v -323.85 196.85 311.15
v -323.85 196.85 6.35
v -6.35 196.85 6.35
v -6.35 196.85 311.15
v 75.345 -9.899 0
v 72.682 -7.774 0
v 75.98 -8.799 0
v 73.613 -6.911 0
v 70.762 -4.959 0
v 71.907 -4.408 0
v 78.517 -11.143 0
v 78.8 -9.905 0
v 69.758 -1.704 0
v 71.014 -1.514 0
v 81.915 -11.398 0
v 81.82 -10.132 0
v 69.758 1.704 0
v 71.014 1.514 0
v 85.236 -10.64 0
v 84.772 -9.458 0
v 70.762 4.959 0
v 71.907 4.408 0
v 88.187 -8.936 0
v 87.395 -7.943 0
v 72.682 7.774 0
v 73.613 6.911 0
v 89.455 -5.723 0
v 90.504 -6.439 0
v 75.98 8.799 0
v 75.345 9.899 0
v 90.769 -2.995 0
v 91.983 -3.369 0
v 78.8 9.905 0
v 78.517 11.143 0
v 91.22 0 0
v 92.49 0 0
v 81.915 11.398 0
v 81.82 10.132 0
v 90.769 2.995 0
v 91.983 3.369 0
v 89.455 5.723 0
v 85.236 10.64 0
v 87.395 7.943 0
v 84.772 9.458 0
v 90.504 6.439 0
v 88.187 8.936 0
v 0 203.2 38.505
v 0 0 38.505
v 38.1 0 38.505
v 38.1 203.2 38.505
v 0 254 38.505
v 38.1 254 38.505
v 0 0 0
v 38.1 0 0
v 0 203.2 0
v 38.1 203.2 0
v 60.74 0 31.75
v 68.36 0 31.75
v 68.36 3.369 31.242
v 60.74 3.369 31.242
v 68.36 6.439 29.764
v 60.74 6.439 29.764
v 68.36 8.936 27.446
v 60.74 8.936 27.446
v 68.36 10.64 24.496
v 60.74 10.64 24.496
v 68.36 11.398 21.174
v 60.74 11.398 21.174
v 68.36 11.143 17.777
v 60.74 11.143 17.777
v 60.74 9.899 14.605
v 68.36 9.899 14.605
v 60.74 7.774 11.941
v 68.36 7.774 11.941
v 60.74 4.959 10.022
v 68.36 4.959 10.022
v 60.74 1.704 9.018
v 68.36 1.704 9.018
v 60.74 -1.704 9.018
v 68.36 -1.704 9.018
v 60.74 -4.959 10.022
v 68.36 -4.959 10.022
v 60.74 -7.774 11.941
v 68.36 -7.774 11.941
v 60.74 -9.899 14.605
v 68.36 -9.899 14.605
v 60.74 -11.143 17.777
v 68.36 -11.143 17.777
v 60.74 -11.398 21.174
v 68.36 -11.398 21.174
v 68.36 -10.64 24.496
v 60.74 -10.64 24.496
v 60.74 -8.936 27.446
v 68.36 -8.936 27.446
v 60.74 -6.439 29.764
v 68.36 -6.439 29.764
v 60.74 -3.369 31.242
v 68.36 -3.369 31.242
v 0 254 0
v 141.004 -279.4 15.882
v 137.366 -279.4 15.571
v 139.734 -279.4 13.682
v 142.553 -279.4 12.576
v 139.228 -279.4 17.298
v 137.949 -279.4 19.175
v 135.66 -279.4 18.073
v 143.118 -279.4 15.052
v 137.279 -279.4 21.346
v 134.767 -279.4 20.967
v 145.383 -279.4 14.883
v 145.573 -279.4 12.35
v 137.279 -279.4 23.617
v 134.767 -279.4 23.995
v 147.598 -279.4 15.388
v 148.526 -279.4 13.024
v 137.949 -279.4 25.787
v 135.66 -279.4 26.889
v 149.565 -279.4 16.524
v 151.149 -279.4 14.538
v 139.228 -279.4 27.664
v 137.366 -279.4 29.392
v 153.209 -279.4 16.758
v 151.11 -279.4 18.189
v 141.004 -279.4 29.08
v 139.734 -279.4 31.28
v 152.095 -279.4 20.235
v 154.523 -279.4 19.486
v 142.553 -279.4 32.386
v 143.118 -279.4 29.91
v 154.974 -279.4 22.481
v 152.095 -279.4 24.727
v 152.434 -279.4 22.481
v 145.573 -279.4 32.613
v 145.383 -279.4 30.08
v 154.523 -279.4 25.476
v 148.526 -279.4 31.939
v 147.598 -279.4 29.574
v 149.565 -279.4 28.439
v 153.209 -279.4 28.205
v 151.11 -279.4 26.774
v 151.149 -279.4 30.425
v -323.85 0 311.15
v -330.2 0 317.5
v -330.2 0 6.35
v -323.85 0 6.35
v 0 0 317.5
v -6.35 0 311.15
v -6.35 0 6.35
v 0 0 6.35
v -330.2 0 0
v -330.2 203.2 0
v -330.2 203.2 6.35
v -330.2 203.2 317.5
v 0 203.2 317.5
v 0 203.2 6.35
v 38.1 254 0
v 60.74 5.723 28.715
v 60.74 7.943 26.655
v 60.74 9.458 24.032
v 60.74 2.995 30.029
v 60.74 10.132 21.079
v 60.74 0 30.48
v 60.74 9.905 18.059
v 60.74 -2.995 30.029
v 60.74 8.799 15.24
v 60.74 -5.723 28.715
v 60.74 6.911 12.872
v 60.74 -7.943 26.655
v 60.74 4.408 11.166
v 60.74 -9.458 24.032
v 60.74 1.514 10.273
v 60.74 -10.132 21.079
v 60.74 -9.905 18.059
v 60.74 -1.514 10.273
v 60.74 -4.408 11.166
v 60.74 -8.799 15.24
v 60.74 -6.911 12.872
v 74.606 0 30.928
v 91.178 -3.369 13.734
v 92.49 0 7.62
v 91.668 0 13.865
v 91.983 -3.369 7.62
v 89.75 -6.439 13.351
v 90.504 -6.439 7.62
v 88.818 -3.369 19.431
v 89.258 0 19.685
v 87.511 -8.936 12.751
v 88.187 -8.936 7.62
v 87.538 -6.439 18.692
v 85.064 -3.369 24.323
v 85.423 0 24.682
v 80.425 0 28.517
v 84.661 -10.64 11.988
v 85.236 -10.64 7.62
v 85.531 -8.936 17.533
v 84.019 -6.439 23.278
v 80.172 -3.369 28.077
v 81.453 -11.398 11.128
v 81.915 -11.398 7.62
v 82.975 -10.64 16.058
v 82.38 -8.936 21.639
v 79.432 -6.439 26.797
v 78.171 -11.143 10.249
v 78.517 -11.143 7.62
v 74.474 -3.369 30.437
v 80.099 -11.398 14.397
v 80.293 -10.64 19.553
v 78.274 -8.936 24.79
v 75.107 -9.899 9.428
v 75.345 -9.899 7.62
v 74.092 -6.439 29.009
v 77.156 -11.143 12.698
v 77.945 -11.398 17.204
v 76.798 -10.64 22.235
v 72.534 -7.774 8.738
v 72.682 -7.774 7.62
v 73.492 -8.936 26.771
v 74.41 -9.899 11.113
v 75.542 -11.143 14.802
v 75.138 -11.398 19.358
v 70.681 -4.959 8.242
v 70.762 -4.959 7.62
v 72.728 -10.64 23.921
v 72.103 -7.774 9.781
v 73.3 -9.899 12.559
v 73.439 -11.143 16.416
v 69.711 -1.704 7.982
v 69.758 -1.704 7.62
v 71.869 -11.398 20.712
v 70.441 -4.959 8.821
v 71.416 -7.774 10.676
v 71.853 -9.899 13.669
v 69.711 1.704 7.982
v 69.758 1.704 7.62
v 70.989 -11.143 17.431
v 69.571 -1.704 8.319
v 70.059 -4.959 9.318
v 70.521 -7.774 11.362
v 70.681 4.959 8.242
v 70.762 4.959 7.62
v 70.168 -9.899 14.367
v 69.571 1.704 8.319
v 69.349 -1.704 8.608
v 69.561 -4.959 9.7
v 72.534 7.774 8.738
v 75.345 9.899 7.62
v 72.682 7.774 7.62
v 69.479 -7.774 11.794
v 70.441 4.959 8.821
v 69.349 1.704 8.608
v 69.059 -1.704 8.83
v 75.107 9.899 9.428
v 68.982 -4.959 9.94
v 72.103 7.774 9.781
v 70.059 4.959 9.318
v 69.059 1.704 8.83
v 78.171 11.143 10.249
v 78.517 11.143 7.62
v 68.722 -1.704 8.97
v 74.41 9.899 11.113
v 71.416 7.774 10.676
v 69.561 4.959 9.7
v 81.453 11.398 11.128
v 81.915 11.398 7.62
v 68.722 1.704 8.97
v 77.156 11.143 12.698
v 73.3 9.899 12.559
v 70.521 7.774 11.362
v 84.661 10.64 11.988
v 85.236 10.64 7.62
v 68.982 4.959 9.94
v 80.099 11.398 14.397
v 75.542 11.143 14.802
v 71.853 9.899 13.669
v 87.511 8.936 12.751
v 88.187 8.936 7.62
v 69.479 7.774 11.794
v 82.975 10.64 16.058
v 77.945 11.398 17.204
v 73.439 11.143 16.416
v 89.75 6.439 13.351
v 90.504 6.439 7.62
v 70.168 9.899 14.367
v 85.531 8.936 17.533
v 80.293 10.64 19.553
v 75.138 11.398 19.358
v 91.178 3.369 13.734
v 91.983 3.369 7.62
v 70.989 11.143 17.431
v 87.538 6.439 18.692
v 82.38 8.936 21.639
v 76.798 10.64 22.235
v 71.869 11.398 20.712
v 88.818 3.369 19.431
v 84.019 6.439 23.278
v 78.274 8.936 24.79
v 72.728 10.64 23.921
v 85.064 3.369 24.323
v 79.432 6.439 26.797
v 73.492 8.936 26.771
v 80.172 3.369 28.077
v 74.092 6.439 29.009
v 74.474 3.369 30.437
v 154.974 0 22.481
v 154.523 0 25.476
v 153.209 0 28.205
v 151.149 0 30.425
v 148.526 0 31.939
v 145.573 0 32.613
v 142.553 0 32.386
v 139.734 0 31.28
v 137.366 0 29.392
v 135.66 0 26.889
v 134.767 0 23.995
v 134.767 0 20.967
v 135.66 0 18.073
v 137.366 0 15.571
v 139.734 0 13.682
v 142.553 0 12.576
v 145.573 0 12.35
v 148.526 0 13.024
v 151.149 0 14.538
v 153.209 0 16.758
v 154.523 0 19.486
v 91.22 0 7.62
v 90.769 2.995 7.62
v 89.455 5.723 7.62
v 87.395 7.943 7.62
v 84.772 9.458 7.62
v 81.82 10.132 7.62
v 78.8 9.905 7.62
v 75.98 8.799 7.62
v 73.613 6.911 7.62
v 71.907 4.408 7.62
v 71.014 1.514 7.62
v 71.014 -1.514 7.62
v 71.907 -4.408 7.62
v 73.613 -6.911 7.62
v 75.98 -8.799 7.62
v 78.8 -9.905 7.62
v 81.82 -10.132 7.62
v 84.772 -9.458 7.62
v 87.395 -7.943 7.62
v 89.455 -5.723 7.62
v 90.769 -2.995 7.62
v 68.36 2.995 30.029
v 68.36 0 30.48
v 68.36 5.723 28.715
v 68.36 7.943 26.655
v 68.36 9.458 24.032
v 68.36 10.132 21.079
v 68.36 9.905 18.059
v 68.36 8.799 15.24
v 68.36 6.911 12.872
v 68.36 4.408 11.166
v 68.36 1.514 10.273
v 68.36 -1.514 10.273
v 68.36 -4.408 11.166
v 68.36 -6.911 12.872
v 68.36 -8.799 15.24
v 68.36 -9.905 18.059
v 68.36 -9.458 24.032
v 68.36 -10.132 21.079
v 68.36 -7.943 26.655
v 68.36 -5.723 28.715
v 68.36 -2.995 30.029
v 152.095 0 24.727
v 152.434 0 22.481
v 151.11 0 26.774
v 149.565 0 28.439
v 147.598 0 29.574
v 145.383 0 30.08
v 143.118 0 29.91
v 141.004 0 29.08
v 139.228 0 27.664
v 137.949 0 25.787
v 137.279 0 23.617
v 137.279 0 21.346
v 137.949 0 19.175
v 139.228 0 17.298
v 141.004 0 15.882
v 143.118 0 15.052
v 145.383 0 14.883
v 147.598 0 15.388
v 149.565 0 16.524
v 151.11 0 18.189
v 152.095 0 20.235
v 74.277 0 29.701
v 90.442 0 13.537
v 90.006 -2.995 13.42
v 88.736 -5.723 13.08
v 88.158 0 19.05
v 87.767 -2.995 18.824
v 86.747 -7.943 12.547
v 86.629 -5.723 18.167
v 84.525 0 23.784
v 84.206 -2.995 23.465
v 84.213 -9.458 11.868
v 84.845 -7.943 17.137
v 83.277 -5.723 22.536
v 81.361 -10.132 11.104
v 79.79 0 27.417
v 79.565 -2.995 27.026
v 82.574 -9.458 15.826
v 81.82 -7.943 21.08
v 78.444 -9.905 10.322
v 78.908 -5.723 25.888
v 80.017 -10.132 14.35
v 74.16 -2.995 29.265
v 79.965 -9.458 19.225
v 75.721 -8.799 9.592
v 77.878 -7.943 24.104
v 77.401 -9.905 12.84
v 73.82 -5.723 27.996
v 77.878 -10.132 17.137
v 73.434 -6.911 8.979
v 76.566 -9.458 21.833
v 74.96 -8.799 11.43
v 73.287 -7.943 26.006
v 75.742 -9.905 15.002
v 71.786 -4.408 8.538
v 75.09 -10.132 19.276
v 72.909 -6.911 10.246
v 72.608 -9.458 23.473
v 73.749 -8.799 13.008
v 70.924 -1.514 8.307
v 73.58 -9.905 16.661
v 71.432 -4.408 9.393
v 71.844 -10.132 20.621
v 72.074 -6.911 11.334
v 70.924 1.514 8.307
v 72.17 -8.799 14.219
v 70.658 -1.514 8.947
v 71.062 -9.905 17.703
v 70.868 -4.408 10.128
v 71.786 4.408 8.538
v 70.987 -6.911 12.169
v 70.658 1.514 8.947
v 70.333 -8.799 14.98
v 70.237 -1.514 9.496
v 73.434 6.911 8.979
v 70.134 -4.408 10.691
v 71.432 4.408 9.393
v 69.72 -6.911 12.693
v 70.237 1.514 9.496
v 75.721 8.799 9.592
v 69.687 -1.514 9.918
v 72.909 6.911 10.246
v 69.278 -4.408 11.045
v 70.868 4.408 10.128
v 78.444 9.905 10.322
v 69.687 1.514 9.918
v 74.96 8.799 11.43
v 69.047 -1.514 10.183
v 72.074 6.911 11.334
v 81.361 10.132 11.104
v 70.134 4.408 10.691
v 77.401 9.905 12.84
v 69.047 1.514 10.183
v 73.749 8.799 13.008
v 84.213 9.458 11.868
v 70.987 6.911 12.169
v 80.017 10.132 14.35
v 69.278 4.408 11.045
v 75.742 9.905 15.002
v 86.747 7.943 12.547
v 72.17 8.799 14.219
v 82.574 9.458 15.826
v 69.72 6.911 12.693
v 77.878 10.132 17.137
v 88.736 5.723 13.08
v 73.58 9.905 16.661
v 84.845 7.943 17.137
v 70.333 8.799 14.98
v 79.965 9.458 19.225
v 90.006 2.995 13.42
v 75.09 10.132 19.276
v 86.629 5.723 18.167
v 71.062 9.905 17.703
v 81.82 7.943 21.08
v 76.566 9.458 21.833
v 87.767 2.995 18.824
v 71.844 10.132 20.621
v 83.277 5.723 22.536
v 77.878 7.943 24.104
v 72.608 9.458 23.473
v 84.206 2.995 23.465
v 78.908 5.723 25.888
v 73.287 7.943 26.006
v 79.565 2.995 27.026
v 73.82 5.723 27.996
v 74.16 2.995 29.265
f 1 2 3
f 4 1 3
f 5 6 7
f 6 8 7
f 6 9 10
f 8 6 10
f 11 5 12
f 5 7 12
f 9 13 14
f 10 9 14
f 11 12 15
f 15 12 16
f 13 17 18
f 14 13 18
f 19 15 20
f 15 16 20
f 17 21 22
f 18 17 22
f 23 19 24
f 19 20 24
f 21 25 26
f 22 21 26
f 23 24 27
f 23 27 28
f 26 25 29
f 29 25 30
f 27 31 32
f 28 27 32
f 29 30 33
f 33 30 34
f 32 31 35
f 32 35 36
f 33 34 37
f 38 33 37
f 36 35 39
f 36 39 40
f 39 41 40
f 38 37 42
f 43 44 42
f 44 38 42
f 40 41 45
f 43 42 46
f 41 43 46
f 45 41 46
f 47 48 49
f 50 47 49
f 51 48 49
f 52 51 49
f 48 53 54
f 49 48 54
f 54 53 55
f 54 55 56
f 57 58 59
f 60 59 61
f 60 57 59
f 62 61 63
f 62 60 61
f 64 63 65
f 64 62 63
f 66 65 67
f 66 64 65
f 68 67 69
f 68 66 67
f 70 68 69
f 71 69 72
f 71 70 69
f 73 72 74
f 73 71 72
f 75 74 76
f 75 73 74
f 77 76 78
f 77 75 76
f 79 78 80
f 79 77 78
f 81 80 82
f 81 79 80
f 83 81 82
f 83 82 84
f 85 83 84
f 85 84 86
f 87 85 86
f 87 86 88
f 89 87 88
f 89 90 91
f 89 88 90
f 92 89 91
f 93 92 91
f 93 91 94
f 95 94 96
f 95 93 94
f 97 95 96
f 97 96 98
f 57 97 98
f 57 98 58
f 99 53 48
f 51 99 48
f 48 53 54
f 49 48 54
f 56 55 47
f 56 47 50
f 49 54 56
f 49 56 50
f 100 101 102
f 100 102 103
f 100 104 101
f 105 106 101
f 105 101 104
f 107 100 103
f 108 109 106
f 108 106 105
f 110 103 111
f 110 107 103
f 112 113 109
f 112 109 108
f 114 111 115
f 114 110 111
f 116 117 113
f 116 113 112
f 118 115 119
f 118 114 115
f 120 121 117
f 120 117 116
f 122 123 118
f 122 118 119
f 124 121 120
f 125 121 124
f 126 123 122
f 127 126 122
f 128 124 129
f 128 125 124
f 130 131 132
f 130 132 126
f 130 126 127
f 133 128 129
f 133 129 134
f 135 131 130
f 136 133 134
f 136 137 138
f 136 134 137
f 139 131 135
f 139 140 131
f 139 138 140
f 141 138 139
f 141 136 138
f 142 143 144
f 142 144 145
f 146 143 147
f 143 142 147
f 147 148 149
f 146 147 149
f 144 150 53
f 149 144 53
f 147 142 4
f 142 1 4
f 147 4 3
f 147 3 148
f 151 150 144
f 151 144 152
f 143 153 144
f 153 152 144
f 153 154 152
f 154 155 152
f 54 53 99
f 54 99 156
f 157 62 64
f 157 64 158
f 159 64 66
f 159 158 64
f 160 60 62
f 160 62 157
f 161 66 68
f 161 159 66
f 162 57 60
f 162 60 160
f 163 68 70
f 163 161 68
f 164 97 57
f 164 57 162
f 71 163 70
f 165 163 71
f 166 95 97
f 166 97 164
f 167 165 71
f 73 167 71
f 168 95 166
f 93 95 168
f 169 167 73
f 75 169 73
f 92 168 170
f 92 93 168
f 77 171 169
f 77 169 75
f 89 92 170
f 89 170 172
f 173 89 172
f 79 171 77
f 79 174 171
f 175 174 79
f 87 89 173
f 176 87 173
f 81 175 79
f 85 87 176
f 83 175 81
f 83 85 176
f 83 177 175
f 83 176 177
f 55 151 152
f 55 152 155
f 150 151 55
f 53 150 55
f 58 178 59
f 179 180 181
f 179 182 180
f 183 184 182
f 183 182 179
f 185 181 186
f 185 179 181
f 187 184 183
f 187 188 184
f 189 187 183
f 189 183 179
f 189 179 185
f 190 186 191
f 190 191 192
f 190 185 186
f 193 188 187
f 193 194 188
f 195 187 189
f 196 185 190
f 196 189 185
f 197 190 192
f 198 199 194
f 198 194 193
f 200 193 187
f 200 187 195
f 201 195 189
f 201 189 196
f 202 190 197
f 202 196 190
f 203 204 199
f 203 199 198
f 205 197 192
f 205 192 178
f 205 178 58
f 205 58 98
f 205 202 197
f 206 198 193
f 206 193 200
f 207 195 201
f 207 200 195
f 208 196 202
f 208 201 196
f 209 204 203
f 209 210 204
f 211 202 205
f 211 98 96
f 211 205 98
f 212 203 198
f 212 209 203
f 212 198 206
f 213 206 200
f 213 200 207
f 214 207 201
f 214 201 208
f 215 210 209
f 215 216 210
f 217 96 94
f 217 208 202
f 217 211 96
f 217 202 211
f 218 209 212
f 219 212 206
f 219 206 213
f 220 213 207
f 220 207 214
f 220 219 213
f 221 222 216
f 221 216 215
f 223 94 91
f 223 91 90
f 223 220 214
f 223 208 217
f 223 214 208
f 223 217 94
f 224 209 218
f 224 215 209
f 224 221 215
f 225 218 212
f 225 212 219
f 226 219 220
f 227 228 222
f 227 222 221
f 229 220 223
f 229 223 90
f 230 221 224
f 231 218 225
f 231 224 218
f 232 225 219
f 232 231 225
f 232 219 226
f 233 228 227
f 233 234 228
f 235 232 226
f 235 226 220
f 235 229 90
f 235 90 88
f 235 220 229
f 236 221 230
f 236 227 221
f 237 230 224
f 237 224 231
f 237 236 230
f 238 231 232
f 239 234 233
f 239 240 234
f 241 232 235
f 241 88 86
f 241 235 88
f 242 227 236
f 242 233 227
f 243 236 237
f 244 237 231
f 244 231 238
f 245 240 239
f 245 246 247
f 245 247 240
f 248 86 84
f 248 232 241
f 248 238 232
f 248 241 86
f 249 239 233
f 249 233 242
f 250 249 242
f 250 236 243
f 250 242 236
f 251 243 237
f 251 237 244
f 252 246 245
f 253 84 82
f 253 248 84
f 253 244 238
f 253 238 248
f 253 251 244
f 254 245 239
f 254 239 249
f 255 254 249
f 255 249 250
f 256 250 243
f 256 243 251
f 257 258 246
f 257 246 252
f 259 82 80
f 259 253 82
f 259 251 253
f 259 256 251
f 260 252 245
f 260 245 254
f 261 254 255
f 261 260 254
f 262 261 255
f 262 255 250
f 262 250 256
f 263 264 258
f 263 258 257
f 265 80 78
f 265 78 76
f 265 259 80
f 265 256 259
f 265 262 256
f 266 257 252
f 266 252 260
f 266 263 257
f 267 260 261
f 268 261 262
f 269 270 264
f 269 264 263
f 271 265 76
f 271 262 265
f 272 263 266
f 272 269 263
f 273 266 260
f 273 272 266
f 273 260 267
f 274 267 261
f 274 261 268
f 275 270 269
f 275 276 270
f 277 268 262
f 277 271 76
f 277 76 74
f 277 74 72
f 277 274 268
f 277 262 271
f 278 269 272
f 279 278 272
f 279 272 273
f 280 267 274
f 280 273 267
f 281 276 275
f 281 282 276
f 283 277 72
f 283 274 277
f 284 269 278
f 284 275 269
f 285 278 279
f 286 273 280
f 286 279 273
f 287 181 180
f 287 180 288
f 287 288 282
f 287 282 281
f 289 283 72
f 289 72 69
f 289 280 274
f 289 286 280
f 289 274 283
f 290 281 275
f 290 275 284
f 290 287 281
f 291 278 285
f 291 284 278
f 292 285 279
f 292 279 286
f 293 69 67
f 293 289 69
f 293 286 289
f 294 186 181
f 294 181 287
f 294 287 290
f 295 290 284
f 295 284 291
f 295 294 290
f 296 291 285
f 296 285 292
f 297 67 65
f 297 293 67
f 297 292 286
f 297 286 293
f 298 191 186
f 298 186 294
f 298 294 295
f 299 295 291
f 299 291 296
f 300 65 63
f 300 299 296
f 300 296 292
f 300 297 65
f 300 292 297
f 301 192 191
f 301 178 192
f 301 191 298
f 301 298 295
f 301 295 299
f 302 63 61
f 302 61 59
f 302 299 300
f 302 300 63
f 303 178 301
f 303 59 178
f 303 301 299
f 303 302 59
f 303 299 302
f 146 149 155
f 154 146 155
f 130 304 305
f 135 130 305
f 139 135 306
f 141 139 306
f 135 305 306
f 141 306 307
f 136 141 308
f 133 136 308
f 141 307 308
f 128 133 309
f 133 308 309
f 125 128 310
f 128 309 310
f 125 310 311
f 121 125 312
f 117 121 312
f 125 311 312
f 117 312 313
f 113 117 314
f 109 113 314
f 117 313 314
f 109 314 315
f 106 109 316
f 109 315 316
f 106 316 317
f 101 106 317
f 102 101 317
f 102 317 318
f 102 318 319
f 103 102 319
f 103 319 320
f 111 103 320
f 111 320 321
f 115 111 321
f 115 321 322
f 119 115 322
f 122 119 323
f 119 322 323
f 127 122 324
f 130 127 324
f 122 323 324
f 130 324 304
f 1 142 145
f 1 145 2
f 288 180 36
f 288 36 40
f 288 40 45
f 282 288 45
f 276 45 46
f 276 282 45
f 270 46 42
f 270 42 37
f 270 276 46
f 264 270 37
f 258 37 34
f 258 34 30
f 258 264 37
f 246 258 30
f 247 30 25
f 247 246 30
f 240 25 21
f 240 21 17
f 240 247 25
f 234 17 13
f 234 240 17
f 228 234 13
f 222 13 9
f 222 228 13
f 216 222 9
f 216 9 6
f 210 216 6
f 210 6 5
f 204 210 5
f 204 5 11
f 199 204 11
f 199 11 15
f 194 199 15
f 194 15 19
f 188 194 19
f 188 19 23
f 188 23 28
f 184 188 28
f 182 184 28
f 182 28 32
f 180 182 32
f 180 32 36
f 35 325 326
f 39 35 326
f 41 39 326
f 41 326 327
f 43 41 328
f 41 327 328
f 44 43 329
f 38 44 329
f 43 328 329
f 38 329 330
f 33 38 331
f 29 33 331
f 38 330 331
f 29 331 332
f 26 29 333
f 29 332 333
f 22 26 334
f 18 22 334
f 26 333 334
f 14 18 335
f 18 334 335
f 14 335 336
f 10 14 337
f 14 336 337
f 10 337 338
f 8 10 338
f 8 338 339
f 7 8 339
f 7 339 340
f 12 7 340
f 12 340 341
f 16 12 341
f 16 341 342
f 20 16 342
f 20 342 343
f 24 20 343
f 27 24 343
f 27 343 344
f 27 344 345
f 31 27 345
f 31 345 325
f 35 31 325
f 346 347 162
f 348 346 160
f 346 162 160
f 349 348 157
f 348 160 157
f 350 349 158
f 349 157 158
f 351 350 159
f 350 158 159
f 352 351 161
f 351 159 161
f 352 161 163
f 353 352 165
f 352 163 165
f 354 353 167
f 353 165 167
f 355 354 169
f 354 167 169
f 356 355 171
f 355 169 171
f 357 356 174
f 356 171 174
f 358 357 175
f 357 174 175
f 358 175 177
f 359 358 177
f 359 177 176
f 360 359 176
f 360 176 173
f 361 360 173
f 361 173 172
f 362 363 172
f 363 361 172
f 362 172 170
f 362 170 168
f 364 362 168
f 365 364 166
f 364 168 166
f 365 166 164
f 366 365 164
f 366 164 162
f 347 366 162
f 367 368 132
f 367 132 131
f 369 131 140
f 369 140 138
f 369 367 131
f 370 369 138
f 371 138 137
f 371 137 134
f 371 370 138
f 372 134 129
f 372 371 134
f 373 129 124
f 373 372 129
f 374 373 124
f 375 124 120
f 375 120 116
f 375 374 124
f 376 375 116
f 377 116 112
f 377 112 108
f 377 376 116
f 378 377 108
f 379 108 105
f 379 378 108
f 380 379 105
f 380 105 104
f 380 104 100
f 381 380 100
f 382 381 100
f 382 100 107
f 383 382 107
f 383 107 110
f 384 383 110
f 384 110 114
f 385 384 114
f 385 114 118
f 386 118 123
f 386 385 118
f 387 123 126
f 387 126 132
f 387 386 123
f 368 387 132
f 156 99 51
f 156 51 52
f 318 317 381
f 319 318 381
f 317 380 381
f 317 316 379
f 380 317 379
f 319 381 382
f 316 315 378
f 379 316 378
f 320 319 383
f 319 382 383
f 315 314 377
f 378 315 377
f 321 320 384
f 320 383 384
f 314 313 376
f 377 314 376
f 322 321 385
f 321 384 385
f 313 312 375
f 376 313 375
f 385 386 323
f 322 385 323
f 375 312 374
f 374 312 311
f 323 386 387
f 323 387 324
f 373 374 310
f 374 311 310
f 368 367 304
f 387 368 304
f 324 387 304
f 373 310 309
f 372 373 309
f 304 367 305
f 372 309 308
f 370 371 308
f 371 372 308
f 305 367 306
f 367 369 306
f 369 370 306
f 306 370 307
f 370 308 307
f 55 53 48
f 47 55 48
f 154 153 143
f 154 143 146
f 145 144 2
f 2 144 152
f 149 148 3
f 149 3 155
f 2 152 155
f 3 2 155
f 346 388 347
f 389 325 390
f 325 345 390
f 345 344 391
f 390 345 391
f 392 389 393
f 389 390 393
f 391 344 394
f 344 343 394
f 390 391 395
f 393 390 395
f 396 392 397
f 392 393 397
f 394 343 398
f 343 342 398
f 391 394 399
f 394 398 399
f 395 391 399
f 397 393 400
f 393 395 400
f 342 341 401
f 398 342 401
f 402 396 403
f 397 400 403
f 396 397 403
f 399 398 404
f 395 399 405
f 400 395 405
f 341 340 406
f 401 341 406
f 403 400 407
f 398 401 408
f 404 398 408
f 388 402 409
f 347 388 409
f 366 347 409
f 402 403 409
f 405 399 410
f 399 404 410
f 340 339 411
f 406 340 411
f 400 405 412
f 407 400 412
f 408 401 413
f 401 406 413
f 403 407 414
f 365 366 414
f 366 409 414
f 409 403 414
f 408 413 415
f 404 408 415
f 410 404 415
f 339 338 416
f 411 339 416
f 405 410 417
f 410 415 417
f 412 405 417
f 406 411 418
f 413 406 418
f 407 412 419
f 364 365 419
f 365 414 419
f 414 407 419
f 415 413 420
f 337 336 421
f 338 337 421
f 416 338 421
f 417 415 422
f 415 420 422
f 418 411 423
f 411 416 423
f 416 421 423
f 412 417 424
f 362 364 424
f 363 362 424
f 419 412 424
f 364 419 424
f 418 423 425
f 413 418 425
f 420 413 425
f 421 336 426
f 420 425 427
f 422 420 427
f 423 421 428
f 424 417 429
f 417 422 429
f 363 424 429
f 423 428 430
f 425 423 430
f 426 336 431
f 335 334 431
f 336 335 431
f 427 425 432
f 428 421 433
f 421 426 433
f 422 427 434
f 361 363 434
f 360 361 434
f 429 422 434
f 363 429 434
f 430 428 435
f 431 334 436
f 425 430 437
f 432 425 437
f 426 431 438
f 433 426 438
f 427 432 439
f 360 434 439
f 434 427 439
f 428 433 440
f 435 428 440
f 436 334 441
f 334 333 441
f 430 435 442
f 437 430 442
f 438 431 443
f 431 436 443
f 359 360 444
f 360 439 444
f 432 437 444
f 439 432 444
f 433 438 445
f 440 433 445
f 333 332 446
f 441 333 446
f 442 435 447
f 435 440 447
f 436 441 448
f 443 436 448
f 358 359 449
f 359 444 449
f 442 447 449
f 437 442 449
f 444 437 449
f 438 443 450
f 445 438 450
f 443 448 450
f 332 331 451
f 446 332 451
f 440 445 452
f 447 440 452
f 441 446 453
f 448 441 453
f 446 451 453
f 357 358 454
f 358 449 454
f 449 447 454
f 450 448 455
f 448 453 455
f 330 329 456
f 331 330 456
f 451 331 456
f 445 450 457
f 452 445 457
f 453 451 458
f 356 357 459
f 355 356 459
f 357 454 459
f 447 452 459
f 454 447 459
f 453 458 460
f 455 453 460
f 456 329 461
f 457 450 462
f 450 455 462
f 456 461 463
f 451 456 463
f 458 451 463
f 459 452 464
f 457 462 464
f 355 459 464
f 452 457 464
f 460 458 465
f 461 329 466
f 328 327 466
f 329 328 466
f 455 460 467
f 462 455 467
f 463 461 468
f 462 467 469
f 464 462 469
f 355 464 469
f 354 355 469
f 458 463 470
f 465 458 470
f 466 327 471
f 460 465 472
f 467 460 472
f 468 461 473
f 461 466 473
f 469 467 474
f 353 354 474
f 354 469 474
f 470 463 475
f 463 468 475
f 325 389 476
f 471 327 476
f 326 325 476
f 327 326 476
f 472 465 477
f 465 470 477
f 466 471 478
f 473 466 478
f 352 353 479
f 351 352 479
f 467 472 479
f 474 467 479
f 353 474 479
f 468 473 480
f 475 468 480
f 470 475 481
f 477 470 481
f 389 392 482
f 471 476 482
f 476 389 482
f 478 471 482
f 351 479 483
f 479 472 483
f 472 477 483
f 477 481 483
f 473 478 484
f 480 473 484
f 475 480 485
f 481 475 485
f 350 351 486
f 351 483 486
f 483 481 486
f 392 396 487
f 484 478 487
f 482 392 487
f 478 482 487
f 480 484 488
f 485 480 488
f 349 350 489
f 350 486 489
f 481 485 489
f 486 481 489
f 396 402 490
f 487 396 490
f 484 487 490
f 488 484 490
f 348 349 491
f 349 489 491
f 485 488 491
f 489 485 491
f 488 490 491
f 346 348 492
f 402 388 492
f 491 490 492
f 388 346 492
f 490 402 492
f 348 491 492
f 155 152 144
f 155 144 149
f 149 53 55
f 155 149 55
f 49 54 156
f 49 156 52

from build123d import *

# Parameters (mm, degrees)
F0_W      = 38.1
F0_H      = 38.5053354341
F1_DEPTH  = 254
F2_DEPTH  = 203.2
F3_W      = 330.2
F3_H      = 203.2
F4_DEPTH  = 6.35
F5_R      = 10.16
F5_R_2    = 7.62
F6_DEPTH  = 279.4
F8_R      = 11.43
F8_R_2    = 10.16
F11_DEPTH = 304.8
F12_W     = 317.5
F12_H     = 196.85
F13_DEPTH = 6.35


with BuildPart() as f1:
    # F0 (on Front) → F1 (new body)
    with BuildSketch(Plane.XZ):
        with Locations((19.05, 19.2526677171)):
            Rectangle(F0_W, F0_H)
    extrude(amount=-F1_DEPTH)


with BuildPart() as f2:
    # F0 (on Front) → F2 (new body)
    with BuildSketch(Plane.XZ):
        with Locations((19.05, 19.2526677171)):
            Rectangle(F0_W, F0_H)
    extrude(amount=-F2_DEPTH)


with BuildPart() as f4:
    # F3 (on Top) → F4 (new body)
    with BuildSketch(Plane.XY):
        with Locations((-165.1, 101.6)):
            Rectangle(F3_W, F3_H)
    extrude(amount=F4_DEPTH)


with BuildPart() as f6:
    # F5 (on Front) → F6 (new body)
    with BuildSketch(Plane.XZ):
        with Locations((144.8139250278, 22.4812030792)):
            Circle(F5_R)
        with Locations((144.8139250278, 22.4812030792)):
            Circle(F5_R_2, mode=Mode.SUBTRACT)
    extrude(amount=F6_DEPTH)


with BuildPart() as f9:
    # F9: sweep along a path in F7
    with BuildLine(Plane.XZ) as f9_path:
        Line((81.0604697181, 0), (81.0604697181, 7.62))
        ThreePointArc((81.0604697181, 7.62), (77.3407258392, 16.6002561211), (68.3604697181, 20.32))
        Line((68.3604697181, 20.32), (60.7404697181, 20.32))
    # F8 (on Top) → F9 (sweep)
    with BuildSketch(Plane.XY):
        with Locations((81.0604697181, 0)):
            Circle(F8_R)
        with Locations((81.0604697181, 0)):
            Circle(F8_R_2, mode=Mode.SUBTRACT)
    sweep(path=f9_path.line)


with BuildPart() as f11:
    # F10 (on face) → F11 (new body)
    with BuildSketch(Plane.XY.offset(6.35)):
        Polygon((-330.2, 203.2), (-330.2, 0), (-323.85, 0), (-323.85, 196.85), (-6.35, 196.85), (-6.35, 0), (0, 0), (0, 203.2), align=None)
    extrude(amount=F11_DEPTH)

    # F12 (on face) → F13 (join)
    with BuildSketch(Plane.XY.offset(311.15)):
        with Locations((-165.1, 98.425)):
            Rectangle(F12_W, F12_H)
        Polygon((-330.2, 203.2), (-330.2, 0), (-323.85, 0), (-323.85, 196.85), (-6.35, 196.85), (-6.35, 0), (0, 0), (0, 203.2), align=None)
    extrude(amount=F13_DEPTH)


solid = Compound([f1.part, f2.part, f4.part, f6.part, f9.part, f11.part])
